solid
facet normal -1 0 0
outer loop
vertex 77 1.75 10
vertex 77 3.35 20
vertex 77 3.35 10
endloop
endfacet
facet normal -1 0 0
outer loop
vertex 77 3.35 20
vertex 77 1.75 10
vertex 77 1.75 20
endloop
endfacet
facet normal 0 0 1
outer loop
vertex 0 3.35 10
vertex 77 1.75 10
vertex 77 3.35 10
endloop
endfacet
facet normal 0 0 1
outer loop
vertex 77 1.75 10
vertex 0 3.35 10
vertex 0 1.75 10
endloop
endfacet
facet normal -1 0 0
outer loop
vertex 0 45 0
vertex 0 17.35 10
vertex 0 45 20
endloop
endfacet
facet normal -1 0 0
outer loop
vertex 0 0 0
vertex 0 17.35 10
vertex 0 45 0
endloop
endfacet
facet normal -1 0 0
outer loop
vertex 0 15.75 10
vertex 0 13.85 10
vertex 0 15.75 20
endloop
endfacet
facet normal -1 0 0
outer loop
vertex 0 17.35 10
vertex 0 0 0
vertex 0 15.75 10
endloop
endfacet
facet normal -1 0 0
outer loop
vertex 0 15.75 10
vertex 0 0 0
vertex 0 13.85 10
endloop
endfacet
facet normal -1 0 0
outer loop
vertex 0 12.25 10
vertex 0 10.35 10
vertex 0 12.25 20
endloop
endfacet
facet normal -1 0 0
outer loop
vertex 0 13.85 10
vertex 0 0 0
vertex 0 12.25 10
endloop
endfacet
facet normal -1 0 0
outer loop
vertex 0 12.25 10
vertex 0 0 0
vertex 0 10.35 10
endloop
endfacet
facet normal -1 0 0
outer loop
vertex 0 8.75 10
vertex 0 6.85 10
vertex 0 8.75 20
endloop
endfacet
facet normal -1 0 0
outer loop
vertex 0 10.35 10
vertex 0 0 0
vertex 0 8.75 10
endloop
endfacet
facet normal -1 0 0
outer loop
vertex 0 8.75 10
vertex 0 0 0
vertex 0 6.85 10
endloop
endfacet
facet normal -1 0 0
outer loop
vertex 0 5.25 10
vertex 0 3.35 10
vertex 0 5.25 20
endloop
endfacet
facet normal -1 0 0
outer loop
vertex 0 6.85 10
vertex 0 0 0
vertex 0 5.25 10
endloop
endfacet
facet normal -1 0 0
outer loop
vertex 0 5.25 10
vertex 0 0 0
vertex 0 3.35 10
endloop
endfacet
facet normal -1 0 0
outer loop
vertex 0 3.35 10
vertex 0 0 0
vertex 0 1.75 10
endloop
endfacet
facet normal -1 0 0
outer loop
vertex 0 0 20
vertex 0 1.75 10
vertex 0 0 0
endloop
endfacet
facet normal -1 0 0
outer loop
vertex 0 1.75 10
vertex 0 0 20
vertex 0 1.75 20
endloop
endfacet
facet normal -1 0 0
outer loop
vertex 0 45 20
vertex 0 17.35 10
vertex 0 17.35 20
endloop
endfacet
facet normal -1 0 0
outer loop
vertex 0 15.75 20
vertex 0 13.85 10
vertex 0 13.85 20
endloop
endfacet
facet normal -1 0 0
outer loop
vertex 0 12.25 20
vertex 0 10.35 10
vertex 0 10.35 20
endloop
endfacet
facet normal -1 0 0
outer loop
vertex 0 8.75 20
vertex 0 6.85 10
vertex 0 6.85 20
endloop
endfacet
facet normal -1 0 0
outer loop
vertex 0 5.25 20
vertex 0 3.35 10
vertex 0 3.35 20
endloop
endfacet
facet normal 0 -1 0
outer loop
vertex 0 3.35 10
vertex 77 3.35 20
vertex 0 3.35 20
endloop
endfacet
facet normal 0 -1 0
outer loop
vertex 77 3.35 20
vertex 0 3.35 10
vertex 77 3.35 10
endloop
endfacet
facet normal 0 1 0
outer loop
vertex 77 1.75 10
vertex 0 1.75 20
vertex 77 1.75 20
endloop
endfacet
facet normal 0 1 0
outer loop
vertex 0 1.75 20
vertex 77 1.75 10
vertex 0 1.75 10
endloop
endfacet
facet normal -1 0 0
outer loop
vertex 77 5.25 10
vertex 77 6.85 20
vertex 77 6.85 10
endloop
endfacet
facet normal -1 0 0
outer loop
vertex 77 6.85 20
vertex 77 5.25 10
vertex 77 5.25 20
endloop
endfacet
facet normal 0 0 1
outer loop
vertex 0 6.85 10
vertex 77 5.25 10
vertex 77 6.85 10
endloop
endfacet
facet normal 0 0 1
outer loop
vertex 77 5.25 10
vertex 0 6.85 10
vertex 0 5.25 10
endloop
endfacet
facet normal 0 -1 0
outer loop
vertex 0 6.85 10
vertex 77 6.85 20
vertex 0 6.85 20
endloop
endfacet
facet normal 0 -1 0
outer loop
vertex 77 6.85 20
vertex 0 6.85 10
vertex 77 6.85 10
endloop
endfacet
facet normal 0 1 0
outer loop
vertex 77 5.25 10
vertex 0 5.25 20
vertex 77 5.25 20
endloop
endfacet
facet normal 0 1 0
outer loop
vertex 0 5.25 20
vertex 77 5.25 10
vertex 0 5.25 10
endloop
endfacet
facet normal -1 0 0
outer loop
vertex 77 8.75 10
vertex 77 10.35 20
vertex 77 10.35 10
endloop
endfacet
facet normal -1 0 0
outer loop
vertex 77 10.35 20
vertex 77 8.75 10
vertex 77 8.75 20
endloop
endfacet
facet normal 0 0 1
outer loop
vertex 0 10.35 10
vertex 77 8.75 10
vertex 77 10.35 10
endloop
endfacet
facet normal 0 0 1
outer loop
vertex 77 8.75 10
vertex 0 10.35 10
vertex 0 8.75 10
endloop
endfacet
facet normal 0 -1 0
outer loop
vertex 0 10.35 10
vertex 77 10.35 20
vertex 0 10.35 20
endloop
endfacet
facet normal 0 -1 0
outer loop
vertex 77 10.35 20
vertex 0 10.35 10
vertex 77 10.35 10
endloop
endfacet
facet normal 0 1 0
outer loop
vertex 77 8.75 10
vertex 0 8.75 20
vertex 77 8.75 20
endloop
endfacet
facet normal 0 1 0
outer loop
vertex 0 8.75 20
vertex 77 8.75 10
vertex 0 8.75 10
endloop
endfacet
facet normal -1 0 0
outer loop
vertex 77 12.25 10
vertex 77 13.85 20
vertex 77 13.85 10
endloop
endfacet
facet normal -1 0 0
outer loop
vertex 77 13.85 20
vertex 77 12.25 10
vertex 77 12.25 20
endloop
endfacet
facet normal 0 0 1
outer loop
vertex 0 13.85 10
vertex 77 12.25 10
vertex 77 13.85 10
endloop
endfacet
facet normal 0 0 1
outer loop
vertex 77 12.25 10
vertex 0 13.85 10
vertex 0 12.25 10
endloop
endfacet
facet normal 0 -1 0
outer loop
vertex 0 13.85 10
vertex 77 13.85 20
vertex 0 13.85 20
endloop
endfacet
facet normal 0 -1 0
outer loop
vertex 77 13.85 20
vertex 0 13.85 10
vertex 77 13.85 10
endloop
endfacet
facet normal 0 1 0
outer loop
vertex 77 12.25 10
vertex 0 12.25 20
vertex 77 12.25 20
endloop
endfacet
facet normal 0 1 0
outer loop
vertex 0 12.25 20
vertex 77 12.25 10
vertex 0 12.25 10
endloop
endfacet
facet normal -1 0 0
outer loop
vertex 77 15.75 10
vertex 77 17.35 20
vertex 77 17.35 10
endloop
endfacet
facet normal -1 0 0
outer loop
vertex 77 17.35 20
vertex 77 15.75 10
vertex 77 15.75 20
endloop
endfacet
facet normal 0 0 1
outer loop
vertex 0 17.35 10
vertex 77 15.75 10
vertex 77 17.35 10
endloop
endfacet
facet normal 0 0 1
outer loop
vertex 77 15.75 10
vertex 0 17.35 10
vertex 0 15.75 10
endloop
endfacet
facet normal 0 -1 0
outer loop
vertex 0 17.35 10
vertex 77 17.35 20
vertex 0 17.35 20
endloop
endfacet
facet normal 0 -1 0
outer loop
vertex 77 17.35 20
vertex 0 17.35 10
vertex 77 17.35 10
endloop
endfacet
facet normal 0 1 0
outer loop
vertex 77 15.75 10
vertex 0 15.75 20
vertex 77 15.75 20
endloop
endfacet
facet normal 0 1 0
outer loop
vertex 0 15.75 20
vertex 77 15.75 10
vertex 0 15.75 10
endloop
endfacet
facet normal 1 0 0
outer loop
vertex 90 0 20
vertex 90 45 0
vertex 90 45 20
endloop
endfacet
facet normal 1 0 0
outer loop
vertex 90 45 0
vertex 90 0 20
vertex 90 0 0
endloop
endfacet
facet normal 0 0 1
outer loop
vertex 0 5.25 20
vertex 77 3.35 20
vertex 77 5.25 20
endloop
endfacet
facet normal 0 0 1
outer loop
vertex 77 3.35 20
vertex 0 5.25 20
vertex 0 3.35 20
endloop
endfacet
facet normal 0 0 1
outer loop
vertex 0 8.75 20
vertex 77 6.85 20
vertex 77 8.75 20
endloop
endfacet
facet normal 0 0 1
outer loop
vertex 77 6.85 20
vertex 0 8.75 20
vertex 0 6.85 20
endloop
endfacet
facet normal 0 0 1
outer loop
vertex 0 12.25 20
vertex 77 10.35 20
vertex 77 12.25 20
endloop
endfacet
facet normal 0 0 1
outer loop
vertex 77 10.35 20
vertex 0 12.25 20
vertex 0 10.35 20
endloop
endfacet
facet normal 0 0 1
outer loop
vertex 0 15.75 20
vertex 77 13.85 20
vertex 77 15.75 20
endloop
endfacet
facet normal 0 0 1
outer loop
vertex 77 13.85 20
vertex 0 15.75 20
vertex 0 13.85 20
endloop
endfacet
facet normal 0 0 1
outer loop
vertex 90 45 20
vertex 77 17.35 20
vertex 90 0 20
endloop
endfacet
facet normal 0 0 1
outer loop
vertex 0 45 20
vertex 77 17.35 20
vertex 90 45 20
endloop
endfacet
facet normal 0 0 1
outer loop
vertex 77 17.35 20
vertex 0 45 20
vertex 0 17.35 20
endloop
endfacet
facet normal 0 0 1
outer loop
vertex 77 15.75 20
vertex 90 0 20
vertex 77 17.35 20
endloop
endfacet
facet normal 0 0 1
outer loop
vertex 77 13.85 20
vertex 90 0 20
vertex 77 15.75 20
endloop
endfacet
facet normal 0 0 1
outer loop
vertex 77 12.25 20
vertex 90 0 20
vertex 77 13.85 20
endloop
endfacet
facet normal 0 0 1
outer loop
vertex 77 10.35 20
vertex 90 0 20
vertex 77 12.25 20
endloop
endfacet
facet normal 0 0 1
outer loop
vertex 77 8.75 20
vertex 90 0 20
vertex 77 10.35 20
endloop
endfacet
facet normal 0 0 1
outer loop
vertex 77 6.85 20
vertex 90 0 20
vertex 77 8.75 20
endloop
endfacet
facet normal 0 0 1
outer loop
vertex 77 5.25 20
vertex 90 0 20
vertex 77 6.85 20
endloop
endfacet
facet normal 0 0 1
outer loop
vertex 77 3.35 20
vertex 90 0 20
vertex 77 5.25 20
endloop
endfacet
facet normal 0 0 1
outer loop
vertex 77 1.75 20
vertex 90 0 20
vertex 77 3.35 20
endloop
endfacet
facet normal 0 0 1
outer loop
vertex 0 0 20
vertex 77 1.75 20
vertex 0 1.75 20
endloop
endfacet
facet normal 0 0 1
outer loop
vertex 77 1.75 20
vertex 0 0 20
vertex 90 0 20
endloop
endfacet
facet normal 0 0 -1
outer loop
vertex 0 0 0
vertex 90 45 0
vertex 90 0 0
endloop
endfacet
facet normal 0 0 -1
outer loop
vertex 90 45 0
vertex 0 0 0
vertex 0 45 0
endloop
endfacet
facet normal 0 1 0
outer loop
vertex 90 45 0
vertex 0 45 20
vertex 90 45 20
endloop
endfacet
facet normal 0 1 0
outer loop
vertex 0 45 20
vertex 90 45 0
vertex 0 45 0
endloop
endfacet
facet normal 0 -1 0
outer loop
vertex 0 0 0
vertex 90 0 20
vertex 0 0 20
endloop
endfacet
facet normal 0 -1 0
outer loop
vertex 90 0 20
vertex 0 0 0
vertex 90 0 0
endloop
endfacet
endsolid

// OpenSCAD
// Drying rack for microscope slides
// Base block: 90 x 45 x 20 mm
// 10 slots: 77 x 1.6 x 10 mm, 3.5 mm spacing, open at top

$fn = 64;

block_x = 90;
block_y = 45;
block_z = 20;

slot_x = 77;
slot_w = 1.6;
slot_z = 10;
slot_z_cut = slot_z + 0.01; // Extend past top face to avoid coplanar faces

slot_spacing = 3.5;
num_slots = 10;

slot_y_start = -(num_slots - 1) / 2 * slot_spacing;

difference() {
    // Block sits on z=0, extends to z=20
    cube([block_x, block_y, block_z], center = false);
    
    // Slots cut from top (z=10 to z=20)
    for (i = [0 : num_slots - 1]) {
        slot_y = slot_y_start + i * slot_spacing;
        translate([0, slot_y, block_z - slot_z]) {
            cube([slot_x, slot_w, slot_z_cut], center = false);
        }
    }
}
